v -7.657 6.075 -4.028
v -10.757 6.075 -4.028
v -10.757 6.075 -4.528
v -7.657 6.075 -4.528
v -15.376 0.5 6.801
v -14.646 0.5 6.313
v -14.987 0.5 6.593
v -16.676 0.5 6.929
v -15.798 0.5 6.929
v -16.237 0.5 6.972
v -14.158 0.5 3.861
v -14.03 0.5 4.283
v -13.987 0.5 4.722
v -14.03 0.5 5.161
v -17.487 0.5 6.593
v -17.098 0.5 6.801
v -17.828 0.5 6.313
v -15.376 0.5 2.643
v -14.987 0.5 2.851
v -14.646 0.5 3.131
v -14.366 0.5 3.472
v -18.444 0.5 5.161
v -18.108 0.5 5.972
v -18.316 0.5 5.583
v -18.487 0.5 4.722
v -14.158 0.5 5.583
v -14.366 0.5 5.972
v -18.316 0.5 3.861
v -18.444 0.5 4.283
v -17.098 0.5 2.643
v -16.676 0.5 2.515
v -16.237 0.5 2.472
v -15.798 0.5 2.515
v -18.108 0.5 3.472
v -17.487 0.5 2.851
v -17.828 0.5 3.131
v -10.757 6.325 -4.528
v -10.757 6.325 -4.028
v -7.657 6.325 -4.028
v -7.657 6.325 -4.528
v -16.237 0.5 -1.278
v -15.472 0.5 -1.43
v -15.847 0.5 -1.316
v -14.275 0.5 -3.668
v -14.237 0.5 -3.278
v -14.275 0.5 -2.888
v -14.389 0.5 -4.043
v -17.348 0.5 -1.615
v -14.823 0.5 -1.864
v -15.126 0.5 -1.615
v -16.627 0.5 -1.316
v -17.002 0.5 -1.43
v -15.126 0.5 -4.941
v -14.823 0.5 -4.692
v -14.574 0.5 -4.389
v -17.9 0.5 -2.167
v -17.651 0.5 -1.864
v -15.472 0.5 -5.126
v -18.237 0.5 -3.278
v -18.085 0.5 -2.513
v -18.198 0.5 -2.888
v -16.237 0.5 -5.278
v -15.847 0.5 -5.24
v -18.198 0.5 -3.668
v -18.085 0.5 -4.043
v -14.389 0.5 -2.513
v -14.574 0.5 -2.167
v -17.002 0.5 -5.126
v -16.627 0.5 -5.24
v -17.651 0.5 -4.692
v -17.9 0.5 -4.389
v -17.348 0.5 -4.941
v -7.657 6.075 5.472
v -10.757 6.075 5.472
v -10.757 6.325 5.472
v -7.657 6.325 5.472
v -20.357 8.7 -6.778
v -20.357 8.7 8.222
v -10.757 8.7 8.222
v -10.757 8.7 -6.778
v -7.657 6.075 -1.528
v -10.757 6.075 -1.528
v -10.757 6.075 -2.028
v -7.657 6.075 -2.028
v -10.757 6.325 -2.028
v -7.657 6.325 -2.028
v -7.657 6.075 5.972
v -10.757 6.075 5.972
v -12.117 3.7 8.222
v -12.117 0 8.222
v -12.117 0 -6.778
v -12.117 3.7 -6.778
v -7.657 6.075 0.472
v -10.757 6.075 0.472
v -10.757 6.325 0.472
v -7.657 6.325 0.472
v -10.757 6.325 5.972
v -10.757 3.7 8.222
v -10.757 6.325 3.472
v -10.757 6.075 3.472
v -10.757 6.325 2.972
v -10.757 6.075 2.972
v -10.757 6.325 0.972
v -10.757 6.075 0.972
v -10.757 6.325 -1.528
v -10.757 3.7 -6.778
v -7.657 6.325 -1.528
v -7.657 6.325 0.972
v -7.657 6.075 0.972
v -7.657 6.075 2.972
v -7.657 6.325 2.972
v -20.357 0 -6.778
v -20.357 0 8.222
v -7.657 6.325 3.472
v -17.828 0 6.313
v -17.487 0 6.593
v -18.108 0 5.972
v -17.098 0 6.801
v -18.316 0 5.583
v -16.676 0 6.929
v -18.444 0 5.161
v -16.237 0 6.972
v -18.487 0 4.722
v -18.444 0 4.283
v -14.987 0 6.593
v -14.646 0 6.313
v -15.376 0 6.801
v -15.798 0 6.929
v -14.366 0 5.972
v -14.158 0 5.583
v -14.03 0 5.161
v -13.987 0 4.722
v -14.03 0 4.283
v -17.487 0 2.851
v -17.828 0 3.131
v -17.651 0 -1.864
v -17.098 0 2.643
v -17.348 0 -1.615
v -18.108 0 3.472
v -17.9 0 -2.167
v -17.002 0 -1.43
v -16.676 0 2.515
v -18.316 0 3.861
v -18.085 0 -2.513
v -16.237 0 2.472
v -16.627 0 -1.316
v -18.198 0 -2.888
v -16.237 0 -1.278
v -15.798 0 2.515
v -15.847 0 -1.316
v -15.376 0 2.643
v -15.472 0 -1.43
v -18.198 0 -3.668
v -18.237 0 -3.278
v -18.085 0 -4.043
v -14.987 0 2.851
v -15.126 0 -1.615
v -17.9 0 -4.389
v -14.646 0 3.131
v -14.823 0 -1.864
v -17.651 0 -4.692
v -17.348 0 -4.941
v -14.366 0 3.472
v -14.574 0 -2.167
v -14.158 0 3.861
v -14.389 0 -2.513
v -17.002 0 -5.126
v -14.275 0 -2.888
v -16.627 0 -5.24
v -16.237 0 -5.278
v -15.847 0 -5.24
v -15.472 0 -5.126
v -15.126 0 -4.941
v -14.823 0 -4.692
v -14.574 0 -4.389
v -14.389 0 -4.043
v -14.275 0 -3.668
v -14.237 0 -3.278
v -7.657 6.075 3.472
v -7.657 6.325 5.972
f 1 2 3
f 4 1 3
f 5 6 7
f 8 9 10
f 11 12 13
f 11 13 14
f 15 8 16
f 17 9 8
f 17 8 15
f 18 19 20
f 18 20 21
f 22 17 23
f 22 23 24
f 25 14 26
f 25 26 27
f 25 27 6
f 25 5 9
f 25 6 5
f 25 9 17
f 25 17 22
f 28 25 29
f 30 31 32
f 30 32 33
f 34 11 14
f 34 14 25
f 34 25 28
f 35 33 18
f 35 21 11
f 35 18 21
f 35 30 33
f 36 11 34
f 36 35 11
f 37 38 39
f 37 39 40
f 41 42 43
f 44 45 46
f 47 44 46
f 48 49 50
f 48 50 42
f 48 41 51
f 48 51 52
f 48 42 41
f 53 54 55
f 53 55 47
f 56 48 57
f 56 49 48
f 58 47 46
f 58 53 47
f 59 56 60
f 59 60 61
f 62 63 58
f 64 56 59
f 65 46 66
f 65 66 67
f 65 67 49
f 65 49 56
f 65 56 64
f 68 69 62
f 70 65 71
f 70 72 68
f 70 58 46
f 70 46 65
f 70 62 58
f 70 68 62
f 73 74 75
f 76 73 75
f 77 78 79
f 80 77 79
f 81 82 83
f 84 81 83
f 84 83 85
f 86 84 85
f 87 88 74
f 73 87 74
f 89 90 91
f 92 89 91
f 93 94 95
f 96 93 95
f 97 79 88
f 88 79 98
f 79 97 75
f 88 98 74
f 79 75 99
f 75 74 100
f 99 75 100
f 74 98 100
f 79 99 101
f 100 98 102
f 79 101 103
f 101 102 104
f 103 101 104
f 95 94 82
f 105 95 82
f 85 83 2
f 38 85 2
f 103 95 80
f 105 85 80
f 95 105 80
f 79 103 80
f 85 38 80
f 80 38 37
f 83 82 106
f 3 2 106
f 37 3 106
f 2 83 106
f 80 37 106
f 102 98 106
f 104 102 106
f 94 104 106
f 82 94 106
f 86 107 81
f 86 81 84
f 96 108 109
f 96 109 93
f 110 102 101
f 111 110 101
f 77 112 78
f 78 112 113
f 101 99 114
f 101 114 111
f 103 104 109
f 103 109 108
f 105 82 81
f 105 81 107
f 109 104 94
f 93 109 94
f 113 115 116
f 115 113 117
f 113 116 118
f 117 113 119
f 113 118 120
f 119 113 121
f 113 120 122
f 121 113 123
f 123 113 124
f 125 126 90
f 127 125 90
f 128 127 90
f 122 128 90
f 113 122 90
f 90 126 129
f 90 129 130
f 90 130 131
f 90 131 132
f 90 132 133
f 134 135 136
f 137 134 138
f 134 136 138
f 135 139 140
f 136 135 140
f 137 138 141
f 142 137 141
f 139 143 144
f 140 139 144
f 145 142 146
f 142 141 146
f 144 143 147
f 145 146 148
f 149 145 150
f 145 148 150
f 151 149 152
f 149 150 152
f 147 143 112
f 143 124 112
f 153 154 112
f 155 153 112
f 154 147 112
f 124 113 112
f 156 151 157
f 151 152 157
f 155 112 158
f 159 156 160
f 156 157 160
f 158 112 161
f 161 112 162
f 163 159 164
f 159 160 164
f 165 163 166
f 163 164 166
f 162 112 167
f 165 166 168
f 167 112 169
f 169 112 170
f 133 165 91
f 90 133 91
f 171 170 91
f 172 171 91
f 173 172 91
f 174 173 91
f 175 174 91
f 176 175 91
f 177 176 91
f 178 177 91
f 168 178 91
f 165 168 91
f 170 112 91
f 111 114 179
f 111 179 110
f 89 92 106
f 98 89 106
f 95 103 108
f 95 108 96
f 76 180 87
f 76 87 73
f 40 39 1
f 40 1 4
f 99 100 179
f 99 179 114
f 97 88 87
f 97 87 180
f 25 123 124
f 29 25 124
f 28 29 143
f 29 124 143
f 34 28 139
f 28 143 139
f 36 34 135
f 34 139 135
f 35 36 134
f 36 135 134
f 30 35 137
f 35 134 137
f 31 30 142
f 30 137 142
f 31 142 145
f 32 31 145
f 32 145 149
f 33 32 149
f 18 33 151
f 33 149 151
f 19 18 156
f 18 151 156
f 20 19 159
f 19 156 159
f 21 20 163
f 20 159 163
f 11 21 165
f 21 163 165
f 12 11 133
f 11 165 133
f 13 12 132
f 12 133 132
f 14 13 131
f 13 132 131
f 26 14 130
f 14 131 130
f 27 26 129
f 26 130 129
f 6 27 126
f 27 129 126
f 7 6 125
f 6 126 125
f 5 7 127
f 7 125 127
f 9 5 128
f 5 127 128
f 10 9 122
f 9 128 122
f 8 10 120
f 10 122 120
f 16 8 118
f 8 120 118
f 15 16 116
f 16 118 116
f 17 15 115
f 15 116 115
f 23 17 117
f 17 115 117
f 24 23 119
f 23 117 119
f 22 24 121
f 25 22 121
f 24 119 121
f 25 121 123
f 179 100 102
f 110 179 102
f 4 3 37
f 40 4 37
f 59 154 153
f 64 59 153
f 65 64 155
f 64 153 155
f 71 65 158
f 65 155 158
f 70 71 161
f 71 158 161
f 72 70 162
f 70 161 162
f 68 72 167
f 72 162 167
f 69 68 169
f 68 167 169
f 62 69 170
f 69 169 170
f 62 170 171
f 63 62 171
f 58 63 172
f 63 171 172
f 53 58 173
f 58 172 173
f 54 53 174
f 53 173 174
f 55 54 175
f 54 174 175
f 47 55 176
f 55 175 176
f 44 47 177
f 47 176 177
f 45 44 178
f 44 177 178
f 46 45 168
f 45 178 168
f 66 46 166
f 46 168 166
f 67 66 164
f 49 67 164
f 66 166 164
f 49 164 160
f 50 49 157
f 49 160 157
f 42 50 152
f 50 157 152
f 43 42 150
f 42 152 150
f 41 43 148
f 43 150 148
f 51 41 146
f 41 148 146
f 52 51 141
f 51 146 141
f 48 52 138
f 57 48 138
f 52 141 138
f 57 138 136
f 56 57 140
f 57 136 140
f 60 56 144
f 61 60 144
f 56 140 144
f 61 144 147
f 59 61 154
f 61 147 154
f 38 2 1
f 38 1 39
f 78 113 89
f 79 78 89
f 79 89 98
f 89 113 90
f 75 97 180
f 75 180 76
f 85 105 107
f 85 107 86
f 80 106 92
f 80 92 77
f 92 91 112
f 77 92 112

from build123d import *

# Parameters (mm, degrees)
SKETCH1_W           = 8.24
SKETCH1_H           = 15
BOSS_EXTRUDE1_DEPTH = 3.7
BOSS_EXTRUDE2_DEPTH = 5
SKETCH3_W           = 0.5
SKETCH3_H           = 0.25
BOSS_EXTRUDE3_DEPTH = 3.1
SKETCH4_R           = 2.25
SKETCH4_R_2         = 2
CUT_EXTRUDE1_DEPTH  = 0.5


with BuildPart() as part:
    # Sketch1 → Boss-Extrude1 (new body)
    with BuildSketch(Plane(origin=(0, 0, 0), x_dir=(1, 0, 0), z_dir=(0, 1, 0))):
        with Locations((-16.236881088, -0.721940399)):
            Rectangle(SKETCH1_W, SKETCH1_H)
    extrude(amount=BOSS_EXTRUDE1_DEPTH)

    # Sketch2 → Boss-Extrude2 (add)
    with BuildSketch(Plane(origin=(0, 3.7, 0), x_dir=(1, 0, 0), z_dir=(0, 1, 0))):
        Polygon((-20.356881088, -8.221940399), (-12.116881088, -8.221940399), (-10.756881088, -8.221940399), (-10.756881088, 6.778059601), (-12.116881088, 6.778059601), (-20.356881088, 6.778059601), align=None)
    extrude(amount=BOSS_EXTRUDE2_DEPTH)

    # Sketch3 → Boss-Extrude3 (add)
    with BuildSketch(Plane(origin=(-10.756881088, 0, 0), x_dir=(0, 0, -1), z_dir=(1, 0, 0))):
        with Locations((-5.721940399, 6.2)):
            Rectangle(SKETCH3_W, SKETCH3_H)
        with Locations((-3.221940399, 6.2)):
            Rectangle(SKETCH3_W, SKETCH3_H)
        with Locations((-0.721940399, 6.2)):
            Rectangle(SKETCH3_W, SKETCH3_H)
        with Locations((1.778059601, 6.2)):
            Rectangle(SKETCH3_W, SKETCH3_H)
        with Locations((4.278059601, 6.2)):
            Rectangle(SKETCH3_W, SKETCH3_H)
    extrude(amount=BOSS_EXTRUDE3_DEPTH)

    # Sketch4 → Cut-Extrude1 (cut)
    with BuildSketch(Plane(origin=(0, 0, 0), x_dir=(-1, 0, 0), z_dir=(0, -1, 0))):
        with Locations((16.236881088, -4.721940399)):
            Circle(SKETCH4_R)
        with Locations((16.236881088, 3.278059601)):
            Circle(SKETCH4_R_2)
    extrude(amount=-CUT_EXTRUDE1_DEPTH, mode=Mode.SUBTRACT)


solid = part.part
